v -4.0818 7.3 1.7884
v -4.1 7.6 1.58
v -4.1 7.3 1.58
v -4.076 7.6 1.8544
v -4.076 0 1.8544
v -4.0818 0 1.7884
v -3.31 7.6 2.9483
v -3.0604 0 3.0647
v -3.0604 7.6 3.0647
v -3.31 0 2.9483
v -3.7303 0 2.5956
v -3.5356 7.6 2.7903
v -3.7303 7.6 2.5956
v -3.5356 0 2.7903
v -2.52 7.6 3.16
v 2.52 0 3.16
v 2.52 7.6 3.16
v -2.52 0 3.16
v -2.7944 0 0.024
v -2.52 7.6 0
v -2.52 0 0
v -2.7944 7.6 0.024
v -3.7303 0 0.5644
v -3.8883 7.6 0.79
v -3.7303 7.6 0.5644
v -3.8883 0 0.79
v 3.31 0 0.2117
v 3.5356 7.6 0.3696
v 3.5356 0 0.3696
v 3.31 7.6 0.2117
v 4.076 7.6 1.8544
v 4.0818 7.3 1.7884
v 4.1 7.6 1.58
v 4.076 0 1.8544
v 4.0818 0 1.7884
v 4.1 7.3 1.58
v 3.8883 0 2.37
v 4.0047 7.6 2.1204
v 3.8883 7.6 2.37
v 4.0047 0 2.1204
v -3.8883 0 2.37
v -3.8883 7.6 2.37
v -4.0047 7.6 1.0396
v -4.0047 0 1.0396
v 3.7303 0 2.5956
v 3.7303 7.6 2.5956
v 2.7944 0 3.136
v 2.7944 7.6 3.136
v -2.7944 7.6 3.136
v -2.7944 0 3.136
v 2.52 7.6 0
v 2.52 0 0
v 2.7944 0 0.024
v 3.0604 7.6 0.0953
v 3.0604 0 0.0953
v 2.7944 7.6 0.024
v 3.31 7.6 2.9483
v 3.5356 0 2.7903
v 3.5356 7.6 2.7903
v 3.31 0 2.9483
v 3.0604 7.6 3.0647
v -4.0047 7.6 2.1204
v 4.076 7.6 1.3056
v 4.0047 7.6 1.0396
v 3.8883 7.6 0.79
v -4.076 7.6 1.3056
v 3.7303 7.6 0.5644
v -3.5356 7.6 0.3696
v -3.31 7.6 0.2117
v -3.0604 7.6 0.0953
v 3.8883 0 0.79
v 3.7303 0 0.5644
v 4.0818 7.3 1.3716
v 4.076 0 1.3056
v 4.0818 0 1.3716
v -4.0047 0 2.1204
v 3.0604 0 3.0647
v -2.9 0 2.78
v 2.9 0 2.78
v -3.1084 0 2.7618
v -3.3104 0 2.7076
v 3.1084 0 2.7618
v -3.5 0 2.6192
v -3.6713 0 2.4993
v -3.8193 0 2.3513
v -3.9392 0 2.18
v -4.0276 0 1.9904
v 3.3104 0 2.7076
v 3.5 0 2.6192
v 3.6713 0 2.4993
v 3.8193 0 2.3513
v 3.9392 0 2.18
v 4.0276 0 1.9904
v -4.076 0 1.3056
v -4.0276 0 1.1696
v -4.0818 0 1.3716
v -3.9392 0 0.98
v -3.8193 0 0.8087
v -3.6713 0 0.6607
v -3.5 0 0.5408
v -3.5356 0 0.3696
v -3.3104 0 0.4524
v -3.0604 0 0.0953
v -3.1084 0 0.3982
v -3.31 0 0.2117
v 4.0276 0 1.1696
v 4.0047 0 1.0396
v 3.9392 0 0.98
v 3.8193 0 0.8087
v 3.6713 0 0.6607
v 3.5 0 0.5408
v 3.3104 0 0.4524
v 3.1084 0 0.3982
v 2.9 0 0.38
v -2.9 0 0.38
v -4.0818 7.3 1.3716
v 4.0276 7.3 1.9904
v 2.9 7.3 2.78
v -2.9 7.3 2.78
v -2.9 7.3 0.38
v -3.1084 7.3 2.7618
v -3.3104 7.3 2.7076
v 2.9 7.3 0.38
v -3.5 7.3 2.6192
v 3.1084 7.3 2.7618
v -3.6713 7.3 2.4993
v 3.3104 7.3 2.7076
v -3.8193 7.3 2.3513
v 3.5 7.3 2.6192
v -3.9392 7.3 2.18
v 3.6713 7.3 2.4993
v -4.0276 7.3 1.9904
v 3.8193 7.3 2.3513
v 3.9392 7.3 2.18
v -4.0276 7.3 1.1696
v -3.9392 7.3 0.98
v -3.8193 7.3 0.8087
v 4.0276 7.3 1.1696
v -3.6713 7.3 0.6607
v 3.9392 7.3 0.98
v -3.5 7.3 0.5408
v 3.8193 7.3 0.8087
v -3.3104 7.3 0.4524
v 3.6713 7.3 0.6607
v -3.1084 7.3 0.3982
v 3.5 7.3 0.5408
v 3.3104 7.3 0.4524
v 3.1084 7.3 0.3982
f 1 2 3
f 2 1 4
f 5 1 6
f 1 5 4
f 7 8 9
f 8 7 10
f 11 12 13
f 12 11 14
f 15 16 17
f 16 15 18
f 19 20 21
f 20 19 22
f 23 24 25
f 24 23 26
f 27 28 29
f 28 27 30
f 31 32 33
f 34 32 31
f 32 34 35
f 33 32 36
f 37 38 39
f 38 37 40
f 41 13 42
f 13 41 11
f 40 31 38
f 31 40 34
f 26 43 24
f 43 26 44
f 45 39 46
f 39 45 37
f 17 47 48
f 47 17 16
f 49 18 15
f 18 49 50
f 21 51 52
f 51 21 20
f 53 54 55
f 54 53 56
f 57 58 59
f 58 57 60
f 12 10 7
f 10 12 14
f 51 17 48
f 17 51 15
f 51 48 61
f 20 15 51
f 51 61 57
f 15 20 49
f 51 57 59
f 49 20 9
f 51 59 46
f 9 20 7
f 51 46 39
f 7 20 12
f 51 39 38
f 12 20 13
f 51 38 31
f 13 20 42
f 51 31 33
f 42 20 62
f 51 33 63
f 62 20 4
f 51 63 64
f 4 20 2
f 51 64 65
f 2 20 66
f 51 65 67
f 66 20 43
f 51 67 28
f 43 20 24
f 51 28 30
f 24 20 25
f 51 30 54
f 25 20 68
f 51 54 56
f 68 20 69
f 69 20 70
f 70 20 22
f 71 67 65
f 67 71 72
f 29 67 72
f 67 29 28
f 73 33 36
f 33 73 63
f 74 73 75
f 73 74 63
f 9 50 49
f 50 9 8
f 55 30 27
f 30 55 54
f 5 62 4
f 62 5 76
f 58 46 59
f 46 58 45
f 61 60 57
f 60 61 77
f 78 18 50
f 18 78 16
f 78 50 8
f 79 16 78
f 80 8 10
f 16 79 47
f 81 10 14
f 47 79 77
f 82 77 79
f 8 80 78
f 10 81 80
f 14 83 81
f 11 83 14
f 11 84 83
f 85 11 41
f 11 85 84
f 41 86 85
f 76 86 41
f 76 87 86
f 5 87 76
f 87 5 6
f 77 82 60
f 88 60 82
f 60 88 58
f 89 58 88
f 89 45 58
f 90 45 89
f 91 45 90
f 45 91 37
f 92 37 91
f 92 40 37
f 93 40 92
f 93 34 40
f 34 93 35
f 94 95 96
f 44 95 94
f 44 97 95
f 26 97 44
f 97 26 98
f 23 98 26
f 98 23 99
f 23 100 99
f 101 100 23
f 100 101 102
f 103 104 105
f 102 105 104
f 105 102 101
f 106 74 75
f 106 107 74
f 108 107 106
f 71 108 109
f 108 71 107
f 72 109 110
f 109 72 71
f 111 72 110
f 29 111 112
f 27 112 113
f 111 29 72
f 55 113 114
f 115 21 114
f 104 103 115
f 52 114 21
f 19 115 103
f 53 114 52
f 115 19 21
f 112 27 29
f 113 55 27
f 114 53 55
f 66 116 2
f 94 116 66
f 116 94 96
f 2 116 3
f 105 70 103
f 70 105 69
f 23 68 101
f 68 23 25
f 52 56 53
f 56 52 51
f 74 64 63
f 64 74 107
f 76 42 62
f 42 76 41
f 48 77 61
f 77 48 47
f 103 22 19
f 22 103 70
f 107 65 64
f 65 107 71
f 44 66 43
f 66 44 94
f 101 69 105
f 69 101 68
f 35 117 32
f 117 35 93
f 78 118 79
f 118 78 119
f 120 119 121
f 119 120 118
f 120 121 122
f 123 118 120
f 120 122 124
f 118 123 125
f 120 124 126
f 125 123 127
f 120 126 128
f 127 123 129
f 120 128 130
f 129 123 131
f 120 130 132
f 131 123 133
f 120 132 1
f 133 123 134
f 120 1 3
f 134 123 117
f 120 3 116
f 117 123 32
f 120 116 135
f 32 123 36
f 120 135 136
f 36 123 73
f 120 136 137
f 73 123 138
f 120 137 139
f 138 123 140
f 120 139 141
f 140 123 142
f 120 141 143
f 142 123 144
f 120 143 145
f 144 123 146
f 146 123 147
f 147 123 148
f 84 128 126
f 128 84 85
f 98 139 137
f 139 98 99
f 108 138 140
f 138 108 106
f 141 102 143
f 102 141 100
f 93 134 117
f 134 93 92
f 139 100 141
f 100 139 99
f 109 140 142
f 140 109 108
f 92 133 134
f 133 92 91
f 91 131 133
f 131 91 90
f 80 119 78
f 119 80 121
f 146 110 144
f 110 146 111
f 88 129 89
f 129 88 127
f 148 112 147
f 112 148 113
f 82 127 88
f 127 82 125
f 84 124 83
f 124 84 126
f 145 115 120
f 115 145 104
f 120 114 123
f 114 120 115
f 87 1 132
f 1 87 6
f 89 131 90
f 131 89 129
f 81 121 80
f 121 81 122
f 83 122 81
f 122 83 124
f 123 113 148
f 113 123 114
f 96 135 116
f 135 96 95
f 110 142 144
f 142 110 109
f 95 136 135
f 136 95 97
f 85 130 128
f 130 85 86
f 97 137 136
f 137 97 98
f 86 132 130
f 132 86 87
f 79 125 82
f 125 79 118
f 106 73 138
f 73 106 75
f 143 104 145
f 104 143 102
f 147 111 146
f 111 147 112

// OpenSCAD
/**
  * Module: Generic Usb Socket
  *
  * Author: Karim Aziiev <karim.aziiev@gmail.com>
  * License: GPL-3.0-or-later
  */

include <../../colors.scad>
include <../../parameters.scad>

use <../../lib/functions.scad>
use <../../lib/plist.scad>
use <../../lib/shapes3d.scad>
use <../../lib/transforms.scad>
use <generic_usb_plug.scad>

/**
  ─────────────────────────────────────────────────────────────────────────────
  usb_socket_size
  ─────────────────────────────────────────────────────────────────────────────
  Return a USB socket's oriented body reference size.

  **Parameters:**
  - `plist`: Socket properties, including local `size=[width, depth, height]`.
  - `usb_plist`: Plug properties used to derive an omitted socket size.
  - `orientation`: Body orientation, default `"wlh"`.

  **Returns:** Oriented `[x, y, z]` body dimensions, excluding an inserted plug.
  Local width is across the opening on X; depth follows insertion along +Y.
 */
function usb_socket_size(plist, usb_plist, orientation="wlh") =
  assert(plist_is(plist) && len(plist) > 0, "Supply a hardware specification")
  let (shell = plist_get("plug_shell_size", usb_plug_params(usb_plist)),
       size = plist_get("size", plist,
                        [shell[0] + 0.5, shell[1] + 2, shell[2] + 3]))
  assert(len(size) == 3 && min(size) > 0, "Socket size must be positive XYZ")
  orientation_size(orientation, size);

/**
  ─────────────────────────────────────────────────────────────────────────────
  usb_socket
  ─────────────────────────────────────────────────────────────────────────────
  Render a USB socket opening toward local -Y and an optional seated plug.

  **Parameters:**
  - `plist`: Local `size=[width, depth, height]`, `color`, `corner_r`,
    `round_axis` and opening-center `offsets=[x,y,z]`.
  - `usb_plist`: Plug properties accepted by `generic_usb_plug`.
  - `orientation`: Orientation of the complete socket and plug.
  - `anchor`: Placement against the socket body, excluding the plug.
  - `show_usb_plug`: Display the seated plug and strain relief.
  - `rotate_z_180`: Apply an additional half-turn to socket and plug together.

  `orientation="lwh"` points the opening toward +X. The plug body meets the
  mouth plane and follows the same offsets as the opening.
 */
module usb_socket(plist,
                  usb_plist,
                  orientation="wlh",
                  anchor=[0, 1, 1],
                  show_usb_plug=false,
                  rotate_z_180=false) {
  assert(plist_is(plist) && len(plist) > 0, "Supply a socket specification");
  assert(plist_is(usb_plist) && len(usb_plist) > 0,
         "Supply a plug specification");
  usb_params = usb_plug_params(usb_plist);

  plug_shell_size = plist_get("plug_shell_size", usb_params);
  plug_shell_round_axis = plist_get("plug_shell_round_axis", usb_params);
  plug_shell_corner_r = plist_get("plug_shell_corner_r", usb_params);

  usb_offset = plist_get("offsets", plist, [0, 0, 0]);

  corner_r = plist_get("corner_r", plist);
  round_axis = plist_get("round_axis", plist, "z");

  size = usb_socket_size(plist, usb_plist);

  color = plist_get("color", plist, metallic_silver_4);

  with_orientation(from="wlh",
                   to=orientation,
                   anchor=anchor,
                   size=size,
                   rotate_z_180=rotate_z_180) {
    translate([0, -size[1] / 2, size[2] / 2]) {
      difference() {
        color(color) {
          cuboid(size=size, anchor=[0, 1, 0], r=corner_r, axis=round_axis);
        }
        translate(usb_offset) {
          translate([0, -0.1, 0]) {
            cuboid(anchor=[0, 1, 0],
                   size=plug_shell_size,
                   r=plug_shell_corner_r,
                   axis=plug_shell_round_axis);
          }
        }
      }

      if (show_usb_plug) {
        translate(usb_offset + [0, plug_shell_size[1], 0]) {
          generic_usb_plug(usb_plist, anchor=[0, -1, 0]);
        }
      }
    }
  }
}

module multi_usb_socket(size=rpi_usb_a_size,
                        usb_rows=2,
                        color=metallic_yellow_silver,
                        offsets=[0, 0, 1],
                        plugged_usb_idxes=[],
                        usb_plist=usb_a_plist,
                        orientation="wlh",
                        rotate_z_180=true,
                        anchor=[0, 1, 1]) {

  single_h = size[2] / usb_rows;

  with_orientation(from="wlh", to=orientation, anchor=anchor, size=size) {
    for (i = [0: usb_rows - 1]) {
      let (z = i * single_h) {
        translate([0, 0, z]) {
          usb_socket(usb_plist=usb_plist,
                     rotate_z_180=rotate_z_180,
                     show_usb_plug=in_list(i, plugged_usb_idxes),
                     anchor=[0, 0, 1],
                     plist=["size", [size[0], size[1], single_h],
                            "color", color,
                            "offsets", offsets]);
        }
      }
    }
  }
}
// multi_usb_socket();
usb_socket(usb_plist=usb_c_plist,
           plist=usb_c_socket_plist,
           show_usb_plug=false);

// generic_usb_plug(plist=usb_c_plist,
//                  anchor=[1, 1, 0]);
